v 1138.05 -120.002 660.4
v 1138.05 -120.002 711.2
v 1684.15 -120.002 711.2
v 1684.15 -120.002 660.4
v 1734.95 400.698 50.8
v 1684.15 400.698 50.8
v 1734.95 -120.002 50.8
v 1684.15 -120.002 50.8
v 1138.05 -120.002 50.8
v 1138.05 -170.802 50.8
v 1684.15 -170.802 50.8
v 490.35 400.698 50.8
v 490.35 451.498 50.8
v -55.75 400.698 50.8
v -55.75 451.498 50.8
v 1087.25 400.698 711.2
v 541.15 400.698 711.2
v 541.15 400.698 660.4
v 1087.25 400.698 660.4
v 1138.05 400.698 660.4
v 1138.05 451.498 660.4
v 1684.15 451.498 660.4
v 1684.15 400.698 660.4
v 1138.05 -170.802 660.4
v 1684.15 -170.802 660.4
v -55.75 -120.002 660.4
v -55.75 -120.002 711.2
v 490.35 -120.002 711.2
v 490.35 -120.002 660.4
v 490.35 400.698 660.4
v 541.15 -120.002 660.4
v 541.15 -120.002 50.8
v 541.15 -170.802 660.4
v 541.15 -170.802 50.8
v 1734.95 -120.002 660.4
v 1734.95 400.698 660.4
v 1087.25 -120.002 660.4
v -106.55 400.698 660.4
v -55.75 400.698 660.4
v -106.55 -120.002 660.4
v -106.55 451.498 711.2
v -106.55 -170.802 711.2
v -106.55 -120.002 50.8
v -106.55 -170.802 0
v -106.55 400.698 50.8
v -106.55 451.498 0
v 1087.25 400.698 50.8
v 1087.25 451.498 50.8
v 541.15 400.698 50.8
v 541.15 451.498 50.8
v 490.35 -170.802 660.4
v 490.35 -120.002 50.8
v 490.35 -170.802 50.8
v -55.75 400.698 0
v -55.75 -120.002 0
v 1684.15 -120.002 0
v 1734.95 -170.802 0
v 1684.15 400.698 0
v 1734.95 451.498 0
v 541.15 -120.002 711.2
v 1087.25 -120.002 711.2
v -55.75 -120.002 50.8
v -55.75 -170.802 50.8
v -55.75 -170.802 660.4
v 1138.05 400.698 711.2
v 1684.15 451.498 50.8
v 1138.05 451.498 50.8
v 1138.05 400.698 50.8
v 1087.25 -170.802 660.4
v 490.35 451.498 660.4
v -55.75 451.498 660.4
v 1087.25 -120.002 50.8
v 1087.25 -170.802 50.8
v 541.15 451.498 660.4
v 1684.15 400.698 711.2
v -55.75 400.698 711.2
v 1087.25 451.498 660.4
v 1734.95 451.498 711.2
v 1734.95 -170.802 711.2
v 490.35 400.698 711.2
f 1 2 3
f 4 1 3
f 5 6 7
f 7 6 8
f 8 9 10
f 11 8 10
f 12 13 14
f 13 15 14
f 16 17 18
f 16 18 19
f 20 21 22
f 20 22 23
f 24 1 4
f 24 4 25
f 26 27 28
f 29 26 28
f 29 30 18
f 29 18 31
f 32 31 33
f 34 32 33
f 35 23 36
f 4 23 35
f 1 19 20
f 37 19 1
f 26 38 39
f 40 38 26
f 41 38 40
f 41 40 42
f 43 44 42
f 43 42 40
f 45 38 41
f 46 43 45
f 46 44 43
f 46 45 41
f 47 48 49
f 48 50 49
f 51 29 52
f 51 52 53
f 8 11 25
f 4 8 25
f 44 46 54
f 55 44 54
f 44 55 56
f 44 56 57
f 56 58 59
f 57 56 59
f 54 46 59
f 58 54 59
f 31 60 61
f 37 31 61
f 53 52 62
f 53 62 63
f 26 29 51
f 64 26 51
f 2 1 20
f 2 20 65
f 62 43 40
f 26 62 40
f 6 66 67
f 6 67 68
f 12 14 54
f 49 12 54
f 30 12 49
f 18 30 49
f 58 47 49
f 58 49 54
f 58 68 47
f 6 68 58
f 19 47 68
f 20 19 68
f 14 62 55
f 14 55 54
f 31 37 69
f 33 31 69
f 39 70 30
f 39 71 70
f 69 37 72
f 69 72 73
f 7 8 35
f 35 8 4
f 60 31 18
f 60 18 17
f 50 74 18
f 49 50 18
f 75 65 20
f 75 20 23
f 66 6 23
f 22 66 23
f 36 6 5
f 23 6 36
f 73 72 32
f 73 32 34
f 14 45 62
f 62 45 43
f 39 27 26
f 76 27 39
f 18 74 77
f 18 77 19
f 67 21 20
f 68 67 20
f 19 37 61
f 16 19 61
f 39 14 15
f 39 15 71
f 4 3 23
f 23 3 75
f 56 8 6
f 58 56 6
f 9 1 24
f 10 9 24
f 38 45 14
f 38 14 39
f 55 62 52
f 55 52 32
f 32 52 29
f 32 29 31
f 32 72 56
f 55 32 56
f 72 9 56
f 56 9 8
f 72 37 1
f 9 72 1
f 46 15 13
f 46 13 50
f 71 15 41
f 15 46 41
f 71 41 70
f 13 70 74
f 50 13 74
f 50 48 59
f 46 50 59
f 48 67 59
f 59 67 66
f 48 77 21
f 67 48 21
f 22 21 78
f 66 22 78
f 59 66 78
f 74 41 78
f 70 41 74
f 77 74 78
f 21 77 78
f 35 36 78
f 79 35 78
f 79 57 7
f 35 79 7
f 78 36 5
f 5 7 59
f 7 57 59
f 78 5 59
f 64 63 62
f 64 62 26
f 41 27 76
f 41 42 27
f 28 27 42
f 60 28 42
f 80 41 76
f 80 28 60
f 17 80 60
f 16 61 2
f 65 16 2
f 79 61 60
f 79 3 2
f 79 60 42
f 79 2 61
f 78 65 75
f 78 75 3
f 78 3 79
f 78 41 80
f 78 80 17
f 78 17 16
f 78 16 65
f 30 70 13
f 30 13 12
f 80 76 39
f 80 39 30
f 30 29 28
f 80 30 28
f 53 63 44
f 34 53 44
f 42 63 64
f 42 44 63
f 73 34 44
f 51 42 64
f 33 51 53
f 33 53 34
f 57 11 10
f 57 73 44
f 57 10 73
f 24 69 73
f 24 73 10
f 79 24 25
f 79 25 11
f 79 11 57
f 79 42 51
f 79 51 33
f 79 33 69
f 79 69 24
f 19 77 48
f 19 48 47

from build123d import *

# Parameters (mm, degrees)
F0_W      = 1841.5
F0_H      = 622.3
F1_DEPTH  = 711.2
F2_W      = 1739.9
F2_H      = 609.6
F3_DEPTH  = 762
F4_W      = 520.7
F4_H      = 609.6
F5_DEPTH  = 2540
F6_W      = 1739.9
F6_H      = 520.7
F7_DEPTH  = 2540
F8_W      = 50.8
F8_H      = 50.8
F9_DEPTH  = 520.7
F10_W     = 50.8
F10_H     = 50.8
F11_DEPTH = 609.6
F12_W     = 50.8
F12_H     = 50.8
F13_DEPTH = 609.6


with BuildPart() as f1:
    # F0 (on Top) → F1 (new body)
    with BuildSketch(Plane.XY):
        with Locations((814.200432, 140.348346)):
            Rectangle(F0_W, F0_H)
    extrude(amount=F1_DEPTH)

    # F2 (on face) → F3 (cut)
    with BuildSketch(Plane.XZ.offset(170.801654)):
        with Locations((814.200432, 355.6)):
            Rectangle(F2_W, F2_H)
    extrude(amount=-F3_DEPTH, mode=Mode.SUBTRACT)

    # F4 (on face) → F5 (cut)
    with BuildSketch(Plane(origin=(-106.549568, 0, 0), x_dir=(0, -1, 0), z_dir=(-1, 0, 0))):
        with Locations((-140.348346, 355.6)):
            Rectangle(F4_W, F4_H)
    extrude(amount=-F5_DEPTH, mode=Mode.SUBTRACT)

    # F6 (on face) → F7 (cut)
    with BuildSketch(Plane.XY.offset(711.2)):
        with Locations((814.200432, 140.348346)):
            Rectangle(F6_W, F6_H)
    extrude(amount=-F7_DEPTH, mode=Mode.SUBTRACT)

    # F8 (on face) → F9 (join)
    with BuildSketch(Plane.XZ.offset(-400.698346)):
        with Locations((515.750432, 685.8)):
            Rectangle(F8_W, F8_H)
        with Locations((1112.650432, 685.8)):
            Rectangle(F8_W, F8_H)
    extrude(amount=F9_DEPTH)

    # F10 (on face) → F11 (join)
    with BuildSketch(Plane(origin=(0, 0, 660.4), x_dir=(1, 0, 0), z_dir=(0, 0, -1))):
        with Locations((1112.650432, -426.098346)):
            Rectangle(F10_W, F10_H)
        with Locations((515.750432, -426.098346)):
            Rectangle(F10_W, F10_H)
    extrude(amount=F11_DEPTH)

    # F12 (on face) → F13 (join)
    with BuildSketch(Plane(origin=(0, 0, 660.4), x_dir=(1, 0, 0), z_dir=(0, 0, -1))):
        with Locations((515.750432, 145.401654)):
            Rectangle(F12_W, F12_H)
        with Locations((1112.650432, 145.401654)):
            Rectangle(F12_W, F12_H)
    extrude(amount=F13_DEPTH)


solid = f1.part
